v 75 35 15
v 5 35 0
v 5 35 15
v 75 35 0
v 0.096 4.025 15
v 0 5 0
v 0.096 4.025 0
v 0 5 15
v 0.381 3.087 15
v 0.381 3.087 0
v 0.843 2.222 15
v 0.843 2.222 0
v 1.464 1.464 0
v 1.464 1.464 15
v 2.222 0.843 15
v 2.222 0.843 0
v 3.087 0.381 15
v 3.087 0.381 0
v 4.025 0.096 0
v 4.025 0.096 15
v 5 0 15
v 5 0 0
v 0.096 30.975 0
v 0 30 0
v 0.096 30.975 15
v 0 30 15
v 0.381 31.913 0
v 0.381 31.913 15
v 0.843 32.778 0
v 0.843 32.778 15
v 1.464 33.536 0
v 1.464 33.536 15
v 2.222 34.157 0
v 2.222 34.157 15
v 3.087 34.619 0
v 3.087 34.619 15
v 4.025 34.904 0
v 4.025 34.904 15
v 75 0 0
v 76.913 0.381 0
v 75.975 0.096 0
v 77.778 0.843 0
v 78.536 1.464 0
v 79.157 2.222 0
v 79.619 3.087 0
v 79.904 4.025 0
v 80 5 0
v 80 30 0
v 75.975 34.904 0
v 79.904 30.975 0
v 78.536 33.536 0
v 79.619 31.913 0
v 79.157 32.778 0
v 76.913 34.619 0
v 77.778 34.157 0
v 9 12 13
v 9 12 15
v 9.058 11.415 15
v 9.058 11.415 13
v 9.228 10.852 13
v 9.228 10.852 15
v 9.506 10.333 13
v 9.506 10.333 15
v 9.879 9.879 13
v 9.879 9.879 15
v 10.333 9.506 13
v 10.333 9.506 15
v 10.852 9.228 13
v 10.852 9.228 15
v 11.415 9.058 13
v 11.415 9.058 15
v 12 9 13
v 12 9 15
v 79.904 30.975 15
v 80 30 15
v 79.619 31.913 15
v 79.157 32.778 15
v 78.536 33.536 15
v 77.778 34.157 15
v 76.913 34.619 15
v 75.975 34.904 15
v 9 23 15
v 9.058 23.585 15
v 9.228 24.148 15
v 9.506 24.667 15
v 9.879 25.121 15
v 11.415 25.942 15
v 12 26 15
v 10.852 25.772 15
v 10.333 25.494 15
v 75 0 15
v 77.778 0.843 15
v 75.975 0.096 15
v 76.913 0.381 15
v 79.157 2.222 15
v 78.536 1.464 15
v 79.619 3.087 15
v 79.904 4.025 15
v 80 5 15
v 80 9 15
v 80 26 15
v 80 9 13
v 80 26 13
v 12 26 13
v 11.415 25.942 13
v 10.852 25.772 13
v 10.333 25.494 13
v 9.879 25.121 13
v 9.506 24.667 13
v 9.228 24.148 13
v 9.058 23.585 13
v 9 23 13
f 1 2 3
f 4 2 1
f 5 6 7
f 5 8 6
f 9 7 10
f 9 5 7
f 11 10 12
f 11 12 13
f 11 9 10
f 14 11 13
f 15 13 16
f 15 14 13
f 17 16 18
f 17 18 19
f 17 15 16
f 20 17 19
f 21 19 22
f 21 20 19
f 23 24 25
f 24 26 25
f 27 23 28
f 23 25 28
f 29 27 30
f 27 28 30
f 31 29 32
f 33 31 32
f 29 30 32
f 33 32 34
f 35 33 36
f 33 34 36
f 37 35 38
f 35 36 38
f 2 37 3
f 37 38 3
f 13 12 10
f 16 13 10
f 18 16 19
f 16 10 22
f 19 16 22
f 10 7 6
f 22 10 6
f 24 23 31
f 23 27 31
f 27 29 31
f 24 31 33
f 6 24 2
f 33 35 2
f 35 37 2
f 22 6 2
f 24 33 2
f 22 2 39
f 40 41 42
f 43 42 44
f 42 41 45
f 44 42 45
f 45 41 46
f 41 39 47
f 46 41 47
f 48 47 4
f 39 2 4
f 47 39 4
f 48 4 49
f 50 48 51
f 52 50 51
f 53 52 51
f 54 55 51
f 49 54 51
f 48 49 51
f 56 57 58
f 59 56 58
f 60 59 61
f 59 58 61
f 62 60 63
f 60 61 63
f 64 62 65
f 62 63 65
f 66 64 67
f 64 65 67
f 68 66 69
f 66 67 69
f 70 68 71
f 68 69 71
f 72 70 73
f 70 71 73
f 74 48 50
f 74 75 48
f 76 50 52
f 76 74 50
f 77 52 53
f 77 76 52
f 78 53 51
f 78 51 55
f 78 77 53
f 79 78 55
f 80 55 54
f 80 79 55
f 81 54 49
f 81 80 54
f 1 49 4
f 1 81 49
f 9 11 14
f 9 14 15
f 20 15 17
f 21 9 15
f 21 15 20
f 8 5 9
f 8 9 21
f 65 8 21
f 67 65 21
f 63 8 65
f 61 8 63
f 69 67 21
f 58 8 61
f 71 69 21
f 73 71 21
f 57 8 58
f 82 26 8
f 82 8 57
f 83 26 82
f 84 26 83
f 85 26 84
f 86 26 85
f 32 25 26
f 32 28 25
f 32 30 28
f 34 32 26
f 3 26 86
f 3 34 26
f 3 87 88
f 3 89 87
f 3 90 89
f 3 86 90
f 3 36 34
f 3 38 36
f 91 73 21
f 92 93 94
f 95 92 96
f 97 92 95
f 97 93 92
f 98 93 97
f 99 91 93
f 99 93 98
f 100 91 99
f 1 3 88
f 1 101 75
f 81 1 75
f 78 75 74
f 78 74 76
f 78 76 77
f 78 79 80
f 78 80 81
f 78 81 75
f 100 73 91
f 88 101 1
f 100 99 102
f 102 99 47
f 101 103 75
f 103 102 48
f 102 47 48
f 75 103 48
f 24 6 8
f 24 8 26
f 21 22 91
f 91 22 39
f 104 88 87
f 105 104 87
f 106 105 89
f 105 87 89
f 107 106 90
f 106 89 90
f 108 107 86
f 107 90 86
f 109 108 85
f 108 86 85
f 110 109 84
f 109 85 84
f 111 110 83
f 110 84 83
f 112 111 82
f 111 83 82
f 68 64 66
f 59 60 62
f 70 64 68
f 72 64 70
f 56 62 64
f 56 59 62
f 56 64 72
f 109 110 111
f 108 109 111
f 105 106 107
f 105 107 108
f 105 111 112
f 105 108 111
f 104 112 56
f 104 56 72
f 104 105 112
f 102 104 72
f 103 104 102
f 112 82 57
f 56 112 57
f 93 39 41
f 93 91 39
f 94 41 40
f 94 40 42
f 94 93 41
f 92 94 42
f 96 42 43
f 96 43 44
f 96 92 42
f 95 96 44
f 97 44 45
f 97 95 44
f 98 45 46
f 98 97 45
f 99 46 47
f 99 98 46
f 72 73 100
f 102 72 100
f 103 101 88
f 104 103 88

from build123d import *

# Parameters (mm, degrees)
F0_W     = 80
F0_H     = 35
F1_DEPTH = 15
F2_R     = 5
F4_DEPTH = 2


with BuildPart() as f1:
    # F0 (on Top) → F1 (new body)
    with BuildSketch(Plane.XY):
        with Locations((40, 17.5)):
            Rectangle(F0_W, F0_H)
    extrude(amount=F1_DEPTH)

    # F2
    f2_edges = [f1.edges().sort_by_distance(p)[0] for p in [
        (0, 0, 7.5),
        (80, 0, 7.5),
        (80, 35, 7.5),
        (0, 35, 7.5),
    ]]
    fillet(f2_edges, radius=F2_R)

    # F3 (on face) → F4 (cut)
    with BuildSketch(Plane.XY.offset(15)):
        with BuildLine():
            Line((80, 26), (12, 26))
            ThreePointArc((12, 26), (9.87868, 25.12132), (9, 23))
            Line((9, 23), (9, 12))
            ThreePointArc((9, 12), (9.87868, 9.87868), (12, 9))
            Line((12, 9), (80, 9))
            Line((80, 9), (80, 26))
        make_face()
    extrude(amount=-F4_DEPTH, mode=Mode.SUBTRACT)


solid = f1.part
